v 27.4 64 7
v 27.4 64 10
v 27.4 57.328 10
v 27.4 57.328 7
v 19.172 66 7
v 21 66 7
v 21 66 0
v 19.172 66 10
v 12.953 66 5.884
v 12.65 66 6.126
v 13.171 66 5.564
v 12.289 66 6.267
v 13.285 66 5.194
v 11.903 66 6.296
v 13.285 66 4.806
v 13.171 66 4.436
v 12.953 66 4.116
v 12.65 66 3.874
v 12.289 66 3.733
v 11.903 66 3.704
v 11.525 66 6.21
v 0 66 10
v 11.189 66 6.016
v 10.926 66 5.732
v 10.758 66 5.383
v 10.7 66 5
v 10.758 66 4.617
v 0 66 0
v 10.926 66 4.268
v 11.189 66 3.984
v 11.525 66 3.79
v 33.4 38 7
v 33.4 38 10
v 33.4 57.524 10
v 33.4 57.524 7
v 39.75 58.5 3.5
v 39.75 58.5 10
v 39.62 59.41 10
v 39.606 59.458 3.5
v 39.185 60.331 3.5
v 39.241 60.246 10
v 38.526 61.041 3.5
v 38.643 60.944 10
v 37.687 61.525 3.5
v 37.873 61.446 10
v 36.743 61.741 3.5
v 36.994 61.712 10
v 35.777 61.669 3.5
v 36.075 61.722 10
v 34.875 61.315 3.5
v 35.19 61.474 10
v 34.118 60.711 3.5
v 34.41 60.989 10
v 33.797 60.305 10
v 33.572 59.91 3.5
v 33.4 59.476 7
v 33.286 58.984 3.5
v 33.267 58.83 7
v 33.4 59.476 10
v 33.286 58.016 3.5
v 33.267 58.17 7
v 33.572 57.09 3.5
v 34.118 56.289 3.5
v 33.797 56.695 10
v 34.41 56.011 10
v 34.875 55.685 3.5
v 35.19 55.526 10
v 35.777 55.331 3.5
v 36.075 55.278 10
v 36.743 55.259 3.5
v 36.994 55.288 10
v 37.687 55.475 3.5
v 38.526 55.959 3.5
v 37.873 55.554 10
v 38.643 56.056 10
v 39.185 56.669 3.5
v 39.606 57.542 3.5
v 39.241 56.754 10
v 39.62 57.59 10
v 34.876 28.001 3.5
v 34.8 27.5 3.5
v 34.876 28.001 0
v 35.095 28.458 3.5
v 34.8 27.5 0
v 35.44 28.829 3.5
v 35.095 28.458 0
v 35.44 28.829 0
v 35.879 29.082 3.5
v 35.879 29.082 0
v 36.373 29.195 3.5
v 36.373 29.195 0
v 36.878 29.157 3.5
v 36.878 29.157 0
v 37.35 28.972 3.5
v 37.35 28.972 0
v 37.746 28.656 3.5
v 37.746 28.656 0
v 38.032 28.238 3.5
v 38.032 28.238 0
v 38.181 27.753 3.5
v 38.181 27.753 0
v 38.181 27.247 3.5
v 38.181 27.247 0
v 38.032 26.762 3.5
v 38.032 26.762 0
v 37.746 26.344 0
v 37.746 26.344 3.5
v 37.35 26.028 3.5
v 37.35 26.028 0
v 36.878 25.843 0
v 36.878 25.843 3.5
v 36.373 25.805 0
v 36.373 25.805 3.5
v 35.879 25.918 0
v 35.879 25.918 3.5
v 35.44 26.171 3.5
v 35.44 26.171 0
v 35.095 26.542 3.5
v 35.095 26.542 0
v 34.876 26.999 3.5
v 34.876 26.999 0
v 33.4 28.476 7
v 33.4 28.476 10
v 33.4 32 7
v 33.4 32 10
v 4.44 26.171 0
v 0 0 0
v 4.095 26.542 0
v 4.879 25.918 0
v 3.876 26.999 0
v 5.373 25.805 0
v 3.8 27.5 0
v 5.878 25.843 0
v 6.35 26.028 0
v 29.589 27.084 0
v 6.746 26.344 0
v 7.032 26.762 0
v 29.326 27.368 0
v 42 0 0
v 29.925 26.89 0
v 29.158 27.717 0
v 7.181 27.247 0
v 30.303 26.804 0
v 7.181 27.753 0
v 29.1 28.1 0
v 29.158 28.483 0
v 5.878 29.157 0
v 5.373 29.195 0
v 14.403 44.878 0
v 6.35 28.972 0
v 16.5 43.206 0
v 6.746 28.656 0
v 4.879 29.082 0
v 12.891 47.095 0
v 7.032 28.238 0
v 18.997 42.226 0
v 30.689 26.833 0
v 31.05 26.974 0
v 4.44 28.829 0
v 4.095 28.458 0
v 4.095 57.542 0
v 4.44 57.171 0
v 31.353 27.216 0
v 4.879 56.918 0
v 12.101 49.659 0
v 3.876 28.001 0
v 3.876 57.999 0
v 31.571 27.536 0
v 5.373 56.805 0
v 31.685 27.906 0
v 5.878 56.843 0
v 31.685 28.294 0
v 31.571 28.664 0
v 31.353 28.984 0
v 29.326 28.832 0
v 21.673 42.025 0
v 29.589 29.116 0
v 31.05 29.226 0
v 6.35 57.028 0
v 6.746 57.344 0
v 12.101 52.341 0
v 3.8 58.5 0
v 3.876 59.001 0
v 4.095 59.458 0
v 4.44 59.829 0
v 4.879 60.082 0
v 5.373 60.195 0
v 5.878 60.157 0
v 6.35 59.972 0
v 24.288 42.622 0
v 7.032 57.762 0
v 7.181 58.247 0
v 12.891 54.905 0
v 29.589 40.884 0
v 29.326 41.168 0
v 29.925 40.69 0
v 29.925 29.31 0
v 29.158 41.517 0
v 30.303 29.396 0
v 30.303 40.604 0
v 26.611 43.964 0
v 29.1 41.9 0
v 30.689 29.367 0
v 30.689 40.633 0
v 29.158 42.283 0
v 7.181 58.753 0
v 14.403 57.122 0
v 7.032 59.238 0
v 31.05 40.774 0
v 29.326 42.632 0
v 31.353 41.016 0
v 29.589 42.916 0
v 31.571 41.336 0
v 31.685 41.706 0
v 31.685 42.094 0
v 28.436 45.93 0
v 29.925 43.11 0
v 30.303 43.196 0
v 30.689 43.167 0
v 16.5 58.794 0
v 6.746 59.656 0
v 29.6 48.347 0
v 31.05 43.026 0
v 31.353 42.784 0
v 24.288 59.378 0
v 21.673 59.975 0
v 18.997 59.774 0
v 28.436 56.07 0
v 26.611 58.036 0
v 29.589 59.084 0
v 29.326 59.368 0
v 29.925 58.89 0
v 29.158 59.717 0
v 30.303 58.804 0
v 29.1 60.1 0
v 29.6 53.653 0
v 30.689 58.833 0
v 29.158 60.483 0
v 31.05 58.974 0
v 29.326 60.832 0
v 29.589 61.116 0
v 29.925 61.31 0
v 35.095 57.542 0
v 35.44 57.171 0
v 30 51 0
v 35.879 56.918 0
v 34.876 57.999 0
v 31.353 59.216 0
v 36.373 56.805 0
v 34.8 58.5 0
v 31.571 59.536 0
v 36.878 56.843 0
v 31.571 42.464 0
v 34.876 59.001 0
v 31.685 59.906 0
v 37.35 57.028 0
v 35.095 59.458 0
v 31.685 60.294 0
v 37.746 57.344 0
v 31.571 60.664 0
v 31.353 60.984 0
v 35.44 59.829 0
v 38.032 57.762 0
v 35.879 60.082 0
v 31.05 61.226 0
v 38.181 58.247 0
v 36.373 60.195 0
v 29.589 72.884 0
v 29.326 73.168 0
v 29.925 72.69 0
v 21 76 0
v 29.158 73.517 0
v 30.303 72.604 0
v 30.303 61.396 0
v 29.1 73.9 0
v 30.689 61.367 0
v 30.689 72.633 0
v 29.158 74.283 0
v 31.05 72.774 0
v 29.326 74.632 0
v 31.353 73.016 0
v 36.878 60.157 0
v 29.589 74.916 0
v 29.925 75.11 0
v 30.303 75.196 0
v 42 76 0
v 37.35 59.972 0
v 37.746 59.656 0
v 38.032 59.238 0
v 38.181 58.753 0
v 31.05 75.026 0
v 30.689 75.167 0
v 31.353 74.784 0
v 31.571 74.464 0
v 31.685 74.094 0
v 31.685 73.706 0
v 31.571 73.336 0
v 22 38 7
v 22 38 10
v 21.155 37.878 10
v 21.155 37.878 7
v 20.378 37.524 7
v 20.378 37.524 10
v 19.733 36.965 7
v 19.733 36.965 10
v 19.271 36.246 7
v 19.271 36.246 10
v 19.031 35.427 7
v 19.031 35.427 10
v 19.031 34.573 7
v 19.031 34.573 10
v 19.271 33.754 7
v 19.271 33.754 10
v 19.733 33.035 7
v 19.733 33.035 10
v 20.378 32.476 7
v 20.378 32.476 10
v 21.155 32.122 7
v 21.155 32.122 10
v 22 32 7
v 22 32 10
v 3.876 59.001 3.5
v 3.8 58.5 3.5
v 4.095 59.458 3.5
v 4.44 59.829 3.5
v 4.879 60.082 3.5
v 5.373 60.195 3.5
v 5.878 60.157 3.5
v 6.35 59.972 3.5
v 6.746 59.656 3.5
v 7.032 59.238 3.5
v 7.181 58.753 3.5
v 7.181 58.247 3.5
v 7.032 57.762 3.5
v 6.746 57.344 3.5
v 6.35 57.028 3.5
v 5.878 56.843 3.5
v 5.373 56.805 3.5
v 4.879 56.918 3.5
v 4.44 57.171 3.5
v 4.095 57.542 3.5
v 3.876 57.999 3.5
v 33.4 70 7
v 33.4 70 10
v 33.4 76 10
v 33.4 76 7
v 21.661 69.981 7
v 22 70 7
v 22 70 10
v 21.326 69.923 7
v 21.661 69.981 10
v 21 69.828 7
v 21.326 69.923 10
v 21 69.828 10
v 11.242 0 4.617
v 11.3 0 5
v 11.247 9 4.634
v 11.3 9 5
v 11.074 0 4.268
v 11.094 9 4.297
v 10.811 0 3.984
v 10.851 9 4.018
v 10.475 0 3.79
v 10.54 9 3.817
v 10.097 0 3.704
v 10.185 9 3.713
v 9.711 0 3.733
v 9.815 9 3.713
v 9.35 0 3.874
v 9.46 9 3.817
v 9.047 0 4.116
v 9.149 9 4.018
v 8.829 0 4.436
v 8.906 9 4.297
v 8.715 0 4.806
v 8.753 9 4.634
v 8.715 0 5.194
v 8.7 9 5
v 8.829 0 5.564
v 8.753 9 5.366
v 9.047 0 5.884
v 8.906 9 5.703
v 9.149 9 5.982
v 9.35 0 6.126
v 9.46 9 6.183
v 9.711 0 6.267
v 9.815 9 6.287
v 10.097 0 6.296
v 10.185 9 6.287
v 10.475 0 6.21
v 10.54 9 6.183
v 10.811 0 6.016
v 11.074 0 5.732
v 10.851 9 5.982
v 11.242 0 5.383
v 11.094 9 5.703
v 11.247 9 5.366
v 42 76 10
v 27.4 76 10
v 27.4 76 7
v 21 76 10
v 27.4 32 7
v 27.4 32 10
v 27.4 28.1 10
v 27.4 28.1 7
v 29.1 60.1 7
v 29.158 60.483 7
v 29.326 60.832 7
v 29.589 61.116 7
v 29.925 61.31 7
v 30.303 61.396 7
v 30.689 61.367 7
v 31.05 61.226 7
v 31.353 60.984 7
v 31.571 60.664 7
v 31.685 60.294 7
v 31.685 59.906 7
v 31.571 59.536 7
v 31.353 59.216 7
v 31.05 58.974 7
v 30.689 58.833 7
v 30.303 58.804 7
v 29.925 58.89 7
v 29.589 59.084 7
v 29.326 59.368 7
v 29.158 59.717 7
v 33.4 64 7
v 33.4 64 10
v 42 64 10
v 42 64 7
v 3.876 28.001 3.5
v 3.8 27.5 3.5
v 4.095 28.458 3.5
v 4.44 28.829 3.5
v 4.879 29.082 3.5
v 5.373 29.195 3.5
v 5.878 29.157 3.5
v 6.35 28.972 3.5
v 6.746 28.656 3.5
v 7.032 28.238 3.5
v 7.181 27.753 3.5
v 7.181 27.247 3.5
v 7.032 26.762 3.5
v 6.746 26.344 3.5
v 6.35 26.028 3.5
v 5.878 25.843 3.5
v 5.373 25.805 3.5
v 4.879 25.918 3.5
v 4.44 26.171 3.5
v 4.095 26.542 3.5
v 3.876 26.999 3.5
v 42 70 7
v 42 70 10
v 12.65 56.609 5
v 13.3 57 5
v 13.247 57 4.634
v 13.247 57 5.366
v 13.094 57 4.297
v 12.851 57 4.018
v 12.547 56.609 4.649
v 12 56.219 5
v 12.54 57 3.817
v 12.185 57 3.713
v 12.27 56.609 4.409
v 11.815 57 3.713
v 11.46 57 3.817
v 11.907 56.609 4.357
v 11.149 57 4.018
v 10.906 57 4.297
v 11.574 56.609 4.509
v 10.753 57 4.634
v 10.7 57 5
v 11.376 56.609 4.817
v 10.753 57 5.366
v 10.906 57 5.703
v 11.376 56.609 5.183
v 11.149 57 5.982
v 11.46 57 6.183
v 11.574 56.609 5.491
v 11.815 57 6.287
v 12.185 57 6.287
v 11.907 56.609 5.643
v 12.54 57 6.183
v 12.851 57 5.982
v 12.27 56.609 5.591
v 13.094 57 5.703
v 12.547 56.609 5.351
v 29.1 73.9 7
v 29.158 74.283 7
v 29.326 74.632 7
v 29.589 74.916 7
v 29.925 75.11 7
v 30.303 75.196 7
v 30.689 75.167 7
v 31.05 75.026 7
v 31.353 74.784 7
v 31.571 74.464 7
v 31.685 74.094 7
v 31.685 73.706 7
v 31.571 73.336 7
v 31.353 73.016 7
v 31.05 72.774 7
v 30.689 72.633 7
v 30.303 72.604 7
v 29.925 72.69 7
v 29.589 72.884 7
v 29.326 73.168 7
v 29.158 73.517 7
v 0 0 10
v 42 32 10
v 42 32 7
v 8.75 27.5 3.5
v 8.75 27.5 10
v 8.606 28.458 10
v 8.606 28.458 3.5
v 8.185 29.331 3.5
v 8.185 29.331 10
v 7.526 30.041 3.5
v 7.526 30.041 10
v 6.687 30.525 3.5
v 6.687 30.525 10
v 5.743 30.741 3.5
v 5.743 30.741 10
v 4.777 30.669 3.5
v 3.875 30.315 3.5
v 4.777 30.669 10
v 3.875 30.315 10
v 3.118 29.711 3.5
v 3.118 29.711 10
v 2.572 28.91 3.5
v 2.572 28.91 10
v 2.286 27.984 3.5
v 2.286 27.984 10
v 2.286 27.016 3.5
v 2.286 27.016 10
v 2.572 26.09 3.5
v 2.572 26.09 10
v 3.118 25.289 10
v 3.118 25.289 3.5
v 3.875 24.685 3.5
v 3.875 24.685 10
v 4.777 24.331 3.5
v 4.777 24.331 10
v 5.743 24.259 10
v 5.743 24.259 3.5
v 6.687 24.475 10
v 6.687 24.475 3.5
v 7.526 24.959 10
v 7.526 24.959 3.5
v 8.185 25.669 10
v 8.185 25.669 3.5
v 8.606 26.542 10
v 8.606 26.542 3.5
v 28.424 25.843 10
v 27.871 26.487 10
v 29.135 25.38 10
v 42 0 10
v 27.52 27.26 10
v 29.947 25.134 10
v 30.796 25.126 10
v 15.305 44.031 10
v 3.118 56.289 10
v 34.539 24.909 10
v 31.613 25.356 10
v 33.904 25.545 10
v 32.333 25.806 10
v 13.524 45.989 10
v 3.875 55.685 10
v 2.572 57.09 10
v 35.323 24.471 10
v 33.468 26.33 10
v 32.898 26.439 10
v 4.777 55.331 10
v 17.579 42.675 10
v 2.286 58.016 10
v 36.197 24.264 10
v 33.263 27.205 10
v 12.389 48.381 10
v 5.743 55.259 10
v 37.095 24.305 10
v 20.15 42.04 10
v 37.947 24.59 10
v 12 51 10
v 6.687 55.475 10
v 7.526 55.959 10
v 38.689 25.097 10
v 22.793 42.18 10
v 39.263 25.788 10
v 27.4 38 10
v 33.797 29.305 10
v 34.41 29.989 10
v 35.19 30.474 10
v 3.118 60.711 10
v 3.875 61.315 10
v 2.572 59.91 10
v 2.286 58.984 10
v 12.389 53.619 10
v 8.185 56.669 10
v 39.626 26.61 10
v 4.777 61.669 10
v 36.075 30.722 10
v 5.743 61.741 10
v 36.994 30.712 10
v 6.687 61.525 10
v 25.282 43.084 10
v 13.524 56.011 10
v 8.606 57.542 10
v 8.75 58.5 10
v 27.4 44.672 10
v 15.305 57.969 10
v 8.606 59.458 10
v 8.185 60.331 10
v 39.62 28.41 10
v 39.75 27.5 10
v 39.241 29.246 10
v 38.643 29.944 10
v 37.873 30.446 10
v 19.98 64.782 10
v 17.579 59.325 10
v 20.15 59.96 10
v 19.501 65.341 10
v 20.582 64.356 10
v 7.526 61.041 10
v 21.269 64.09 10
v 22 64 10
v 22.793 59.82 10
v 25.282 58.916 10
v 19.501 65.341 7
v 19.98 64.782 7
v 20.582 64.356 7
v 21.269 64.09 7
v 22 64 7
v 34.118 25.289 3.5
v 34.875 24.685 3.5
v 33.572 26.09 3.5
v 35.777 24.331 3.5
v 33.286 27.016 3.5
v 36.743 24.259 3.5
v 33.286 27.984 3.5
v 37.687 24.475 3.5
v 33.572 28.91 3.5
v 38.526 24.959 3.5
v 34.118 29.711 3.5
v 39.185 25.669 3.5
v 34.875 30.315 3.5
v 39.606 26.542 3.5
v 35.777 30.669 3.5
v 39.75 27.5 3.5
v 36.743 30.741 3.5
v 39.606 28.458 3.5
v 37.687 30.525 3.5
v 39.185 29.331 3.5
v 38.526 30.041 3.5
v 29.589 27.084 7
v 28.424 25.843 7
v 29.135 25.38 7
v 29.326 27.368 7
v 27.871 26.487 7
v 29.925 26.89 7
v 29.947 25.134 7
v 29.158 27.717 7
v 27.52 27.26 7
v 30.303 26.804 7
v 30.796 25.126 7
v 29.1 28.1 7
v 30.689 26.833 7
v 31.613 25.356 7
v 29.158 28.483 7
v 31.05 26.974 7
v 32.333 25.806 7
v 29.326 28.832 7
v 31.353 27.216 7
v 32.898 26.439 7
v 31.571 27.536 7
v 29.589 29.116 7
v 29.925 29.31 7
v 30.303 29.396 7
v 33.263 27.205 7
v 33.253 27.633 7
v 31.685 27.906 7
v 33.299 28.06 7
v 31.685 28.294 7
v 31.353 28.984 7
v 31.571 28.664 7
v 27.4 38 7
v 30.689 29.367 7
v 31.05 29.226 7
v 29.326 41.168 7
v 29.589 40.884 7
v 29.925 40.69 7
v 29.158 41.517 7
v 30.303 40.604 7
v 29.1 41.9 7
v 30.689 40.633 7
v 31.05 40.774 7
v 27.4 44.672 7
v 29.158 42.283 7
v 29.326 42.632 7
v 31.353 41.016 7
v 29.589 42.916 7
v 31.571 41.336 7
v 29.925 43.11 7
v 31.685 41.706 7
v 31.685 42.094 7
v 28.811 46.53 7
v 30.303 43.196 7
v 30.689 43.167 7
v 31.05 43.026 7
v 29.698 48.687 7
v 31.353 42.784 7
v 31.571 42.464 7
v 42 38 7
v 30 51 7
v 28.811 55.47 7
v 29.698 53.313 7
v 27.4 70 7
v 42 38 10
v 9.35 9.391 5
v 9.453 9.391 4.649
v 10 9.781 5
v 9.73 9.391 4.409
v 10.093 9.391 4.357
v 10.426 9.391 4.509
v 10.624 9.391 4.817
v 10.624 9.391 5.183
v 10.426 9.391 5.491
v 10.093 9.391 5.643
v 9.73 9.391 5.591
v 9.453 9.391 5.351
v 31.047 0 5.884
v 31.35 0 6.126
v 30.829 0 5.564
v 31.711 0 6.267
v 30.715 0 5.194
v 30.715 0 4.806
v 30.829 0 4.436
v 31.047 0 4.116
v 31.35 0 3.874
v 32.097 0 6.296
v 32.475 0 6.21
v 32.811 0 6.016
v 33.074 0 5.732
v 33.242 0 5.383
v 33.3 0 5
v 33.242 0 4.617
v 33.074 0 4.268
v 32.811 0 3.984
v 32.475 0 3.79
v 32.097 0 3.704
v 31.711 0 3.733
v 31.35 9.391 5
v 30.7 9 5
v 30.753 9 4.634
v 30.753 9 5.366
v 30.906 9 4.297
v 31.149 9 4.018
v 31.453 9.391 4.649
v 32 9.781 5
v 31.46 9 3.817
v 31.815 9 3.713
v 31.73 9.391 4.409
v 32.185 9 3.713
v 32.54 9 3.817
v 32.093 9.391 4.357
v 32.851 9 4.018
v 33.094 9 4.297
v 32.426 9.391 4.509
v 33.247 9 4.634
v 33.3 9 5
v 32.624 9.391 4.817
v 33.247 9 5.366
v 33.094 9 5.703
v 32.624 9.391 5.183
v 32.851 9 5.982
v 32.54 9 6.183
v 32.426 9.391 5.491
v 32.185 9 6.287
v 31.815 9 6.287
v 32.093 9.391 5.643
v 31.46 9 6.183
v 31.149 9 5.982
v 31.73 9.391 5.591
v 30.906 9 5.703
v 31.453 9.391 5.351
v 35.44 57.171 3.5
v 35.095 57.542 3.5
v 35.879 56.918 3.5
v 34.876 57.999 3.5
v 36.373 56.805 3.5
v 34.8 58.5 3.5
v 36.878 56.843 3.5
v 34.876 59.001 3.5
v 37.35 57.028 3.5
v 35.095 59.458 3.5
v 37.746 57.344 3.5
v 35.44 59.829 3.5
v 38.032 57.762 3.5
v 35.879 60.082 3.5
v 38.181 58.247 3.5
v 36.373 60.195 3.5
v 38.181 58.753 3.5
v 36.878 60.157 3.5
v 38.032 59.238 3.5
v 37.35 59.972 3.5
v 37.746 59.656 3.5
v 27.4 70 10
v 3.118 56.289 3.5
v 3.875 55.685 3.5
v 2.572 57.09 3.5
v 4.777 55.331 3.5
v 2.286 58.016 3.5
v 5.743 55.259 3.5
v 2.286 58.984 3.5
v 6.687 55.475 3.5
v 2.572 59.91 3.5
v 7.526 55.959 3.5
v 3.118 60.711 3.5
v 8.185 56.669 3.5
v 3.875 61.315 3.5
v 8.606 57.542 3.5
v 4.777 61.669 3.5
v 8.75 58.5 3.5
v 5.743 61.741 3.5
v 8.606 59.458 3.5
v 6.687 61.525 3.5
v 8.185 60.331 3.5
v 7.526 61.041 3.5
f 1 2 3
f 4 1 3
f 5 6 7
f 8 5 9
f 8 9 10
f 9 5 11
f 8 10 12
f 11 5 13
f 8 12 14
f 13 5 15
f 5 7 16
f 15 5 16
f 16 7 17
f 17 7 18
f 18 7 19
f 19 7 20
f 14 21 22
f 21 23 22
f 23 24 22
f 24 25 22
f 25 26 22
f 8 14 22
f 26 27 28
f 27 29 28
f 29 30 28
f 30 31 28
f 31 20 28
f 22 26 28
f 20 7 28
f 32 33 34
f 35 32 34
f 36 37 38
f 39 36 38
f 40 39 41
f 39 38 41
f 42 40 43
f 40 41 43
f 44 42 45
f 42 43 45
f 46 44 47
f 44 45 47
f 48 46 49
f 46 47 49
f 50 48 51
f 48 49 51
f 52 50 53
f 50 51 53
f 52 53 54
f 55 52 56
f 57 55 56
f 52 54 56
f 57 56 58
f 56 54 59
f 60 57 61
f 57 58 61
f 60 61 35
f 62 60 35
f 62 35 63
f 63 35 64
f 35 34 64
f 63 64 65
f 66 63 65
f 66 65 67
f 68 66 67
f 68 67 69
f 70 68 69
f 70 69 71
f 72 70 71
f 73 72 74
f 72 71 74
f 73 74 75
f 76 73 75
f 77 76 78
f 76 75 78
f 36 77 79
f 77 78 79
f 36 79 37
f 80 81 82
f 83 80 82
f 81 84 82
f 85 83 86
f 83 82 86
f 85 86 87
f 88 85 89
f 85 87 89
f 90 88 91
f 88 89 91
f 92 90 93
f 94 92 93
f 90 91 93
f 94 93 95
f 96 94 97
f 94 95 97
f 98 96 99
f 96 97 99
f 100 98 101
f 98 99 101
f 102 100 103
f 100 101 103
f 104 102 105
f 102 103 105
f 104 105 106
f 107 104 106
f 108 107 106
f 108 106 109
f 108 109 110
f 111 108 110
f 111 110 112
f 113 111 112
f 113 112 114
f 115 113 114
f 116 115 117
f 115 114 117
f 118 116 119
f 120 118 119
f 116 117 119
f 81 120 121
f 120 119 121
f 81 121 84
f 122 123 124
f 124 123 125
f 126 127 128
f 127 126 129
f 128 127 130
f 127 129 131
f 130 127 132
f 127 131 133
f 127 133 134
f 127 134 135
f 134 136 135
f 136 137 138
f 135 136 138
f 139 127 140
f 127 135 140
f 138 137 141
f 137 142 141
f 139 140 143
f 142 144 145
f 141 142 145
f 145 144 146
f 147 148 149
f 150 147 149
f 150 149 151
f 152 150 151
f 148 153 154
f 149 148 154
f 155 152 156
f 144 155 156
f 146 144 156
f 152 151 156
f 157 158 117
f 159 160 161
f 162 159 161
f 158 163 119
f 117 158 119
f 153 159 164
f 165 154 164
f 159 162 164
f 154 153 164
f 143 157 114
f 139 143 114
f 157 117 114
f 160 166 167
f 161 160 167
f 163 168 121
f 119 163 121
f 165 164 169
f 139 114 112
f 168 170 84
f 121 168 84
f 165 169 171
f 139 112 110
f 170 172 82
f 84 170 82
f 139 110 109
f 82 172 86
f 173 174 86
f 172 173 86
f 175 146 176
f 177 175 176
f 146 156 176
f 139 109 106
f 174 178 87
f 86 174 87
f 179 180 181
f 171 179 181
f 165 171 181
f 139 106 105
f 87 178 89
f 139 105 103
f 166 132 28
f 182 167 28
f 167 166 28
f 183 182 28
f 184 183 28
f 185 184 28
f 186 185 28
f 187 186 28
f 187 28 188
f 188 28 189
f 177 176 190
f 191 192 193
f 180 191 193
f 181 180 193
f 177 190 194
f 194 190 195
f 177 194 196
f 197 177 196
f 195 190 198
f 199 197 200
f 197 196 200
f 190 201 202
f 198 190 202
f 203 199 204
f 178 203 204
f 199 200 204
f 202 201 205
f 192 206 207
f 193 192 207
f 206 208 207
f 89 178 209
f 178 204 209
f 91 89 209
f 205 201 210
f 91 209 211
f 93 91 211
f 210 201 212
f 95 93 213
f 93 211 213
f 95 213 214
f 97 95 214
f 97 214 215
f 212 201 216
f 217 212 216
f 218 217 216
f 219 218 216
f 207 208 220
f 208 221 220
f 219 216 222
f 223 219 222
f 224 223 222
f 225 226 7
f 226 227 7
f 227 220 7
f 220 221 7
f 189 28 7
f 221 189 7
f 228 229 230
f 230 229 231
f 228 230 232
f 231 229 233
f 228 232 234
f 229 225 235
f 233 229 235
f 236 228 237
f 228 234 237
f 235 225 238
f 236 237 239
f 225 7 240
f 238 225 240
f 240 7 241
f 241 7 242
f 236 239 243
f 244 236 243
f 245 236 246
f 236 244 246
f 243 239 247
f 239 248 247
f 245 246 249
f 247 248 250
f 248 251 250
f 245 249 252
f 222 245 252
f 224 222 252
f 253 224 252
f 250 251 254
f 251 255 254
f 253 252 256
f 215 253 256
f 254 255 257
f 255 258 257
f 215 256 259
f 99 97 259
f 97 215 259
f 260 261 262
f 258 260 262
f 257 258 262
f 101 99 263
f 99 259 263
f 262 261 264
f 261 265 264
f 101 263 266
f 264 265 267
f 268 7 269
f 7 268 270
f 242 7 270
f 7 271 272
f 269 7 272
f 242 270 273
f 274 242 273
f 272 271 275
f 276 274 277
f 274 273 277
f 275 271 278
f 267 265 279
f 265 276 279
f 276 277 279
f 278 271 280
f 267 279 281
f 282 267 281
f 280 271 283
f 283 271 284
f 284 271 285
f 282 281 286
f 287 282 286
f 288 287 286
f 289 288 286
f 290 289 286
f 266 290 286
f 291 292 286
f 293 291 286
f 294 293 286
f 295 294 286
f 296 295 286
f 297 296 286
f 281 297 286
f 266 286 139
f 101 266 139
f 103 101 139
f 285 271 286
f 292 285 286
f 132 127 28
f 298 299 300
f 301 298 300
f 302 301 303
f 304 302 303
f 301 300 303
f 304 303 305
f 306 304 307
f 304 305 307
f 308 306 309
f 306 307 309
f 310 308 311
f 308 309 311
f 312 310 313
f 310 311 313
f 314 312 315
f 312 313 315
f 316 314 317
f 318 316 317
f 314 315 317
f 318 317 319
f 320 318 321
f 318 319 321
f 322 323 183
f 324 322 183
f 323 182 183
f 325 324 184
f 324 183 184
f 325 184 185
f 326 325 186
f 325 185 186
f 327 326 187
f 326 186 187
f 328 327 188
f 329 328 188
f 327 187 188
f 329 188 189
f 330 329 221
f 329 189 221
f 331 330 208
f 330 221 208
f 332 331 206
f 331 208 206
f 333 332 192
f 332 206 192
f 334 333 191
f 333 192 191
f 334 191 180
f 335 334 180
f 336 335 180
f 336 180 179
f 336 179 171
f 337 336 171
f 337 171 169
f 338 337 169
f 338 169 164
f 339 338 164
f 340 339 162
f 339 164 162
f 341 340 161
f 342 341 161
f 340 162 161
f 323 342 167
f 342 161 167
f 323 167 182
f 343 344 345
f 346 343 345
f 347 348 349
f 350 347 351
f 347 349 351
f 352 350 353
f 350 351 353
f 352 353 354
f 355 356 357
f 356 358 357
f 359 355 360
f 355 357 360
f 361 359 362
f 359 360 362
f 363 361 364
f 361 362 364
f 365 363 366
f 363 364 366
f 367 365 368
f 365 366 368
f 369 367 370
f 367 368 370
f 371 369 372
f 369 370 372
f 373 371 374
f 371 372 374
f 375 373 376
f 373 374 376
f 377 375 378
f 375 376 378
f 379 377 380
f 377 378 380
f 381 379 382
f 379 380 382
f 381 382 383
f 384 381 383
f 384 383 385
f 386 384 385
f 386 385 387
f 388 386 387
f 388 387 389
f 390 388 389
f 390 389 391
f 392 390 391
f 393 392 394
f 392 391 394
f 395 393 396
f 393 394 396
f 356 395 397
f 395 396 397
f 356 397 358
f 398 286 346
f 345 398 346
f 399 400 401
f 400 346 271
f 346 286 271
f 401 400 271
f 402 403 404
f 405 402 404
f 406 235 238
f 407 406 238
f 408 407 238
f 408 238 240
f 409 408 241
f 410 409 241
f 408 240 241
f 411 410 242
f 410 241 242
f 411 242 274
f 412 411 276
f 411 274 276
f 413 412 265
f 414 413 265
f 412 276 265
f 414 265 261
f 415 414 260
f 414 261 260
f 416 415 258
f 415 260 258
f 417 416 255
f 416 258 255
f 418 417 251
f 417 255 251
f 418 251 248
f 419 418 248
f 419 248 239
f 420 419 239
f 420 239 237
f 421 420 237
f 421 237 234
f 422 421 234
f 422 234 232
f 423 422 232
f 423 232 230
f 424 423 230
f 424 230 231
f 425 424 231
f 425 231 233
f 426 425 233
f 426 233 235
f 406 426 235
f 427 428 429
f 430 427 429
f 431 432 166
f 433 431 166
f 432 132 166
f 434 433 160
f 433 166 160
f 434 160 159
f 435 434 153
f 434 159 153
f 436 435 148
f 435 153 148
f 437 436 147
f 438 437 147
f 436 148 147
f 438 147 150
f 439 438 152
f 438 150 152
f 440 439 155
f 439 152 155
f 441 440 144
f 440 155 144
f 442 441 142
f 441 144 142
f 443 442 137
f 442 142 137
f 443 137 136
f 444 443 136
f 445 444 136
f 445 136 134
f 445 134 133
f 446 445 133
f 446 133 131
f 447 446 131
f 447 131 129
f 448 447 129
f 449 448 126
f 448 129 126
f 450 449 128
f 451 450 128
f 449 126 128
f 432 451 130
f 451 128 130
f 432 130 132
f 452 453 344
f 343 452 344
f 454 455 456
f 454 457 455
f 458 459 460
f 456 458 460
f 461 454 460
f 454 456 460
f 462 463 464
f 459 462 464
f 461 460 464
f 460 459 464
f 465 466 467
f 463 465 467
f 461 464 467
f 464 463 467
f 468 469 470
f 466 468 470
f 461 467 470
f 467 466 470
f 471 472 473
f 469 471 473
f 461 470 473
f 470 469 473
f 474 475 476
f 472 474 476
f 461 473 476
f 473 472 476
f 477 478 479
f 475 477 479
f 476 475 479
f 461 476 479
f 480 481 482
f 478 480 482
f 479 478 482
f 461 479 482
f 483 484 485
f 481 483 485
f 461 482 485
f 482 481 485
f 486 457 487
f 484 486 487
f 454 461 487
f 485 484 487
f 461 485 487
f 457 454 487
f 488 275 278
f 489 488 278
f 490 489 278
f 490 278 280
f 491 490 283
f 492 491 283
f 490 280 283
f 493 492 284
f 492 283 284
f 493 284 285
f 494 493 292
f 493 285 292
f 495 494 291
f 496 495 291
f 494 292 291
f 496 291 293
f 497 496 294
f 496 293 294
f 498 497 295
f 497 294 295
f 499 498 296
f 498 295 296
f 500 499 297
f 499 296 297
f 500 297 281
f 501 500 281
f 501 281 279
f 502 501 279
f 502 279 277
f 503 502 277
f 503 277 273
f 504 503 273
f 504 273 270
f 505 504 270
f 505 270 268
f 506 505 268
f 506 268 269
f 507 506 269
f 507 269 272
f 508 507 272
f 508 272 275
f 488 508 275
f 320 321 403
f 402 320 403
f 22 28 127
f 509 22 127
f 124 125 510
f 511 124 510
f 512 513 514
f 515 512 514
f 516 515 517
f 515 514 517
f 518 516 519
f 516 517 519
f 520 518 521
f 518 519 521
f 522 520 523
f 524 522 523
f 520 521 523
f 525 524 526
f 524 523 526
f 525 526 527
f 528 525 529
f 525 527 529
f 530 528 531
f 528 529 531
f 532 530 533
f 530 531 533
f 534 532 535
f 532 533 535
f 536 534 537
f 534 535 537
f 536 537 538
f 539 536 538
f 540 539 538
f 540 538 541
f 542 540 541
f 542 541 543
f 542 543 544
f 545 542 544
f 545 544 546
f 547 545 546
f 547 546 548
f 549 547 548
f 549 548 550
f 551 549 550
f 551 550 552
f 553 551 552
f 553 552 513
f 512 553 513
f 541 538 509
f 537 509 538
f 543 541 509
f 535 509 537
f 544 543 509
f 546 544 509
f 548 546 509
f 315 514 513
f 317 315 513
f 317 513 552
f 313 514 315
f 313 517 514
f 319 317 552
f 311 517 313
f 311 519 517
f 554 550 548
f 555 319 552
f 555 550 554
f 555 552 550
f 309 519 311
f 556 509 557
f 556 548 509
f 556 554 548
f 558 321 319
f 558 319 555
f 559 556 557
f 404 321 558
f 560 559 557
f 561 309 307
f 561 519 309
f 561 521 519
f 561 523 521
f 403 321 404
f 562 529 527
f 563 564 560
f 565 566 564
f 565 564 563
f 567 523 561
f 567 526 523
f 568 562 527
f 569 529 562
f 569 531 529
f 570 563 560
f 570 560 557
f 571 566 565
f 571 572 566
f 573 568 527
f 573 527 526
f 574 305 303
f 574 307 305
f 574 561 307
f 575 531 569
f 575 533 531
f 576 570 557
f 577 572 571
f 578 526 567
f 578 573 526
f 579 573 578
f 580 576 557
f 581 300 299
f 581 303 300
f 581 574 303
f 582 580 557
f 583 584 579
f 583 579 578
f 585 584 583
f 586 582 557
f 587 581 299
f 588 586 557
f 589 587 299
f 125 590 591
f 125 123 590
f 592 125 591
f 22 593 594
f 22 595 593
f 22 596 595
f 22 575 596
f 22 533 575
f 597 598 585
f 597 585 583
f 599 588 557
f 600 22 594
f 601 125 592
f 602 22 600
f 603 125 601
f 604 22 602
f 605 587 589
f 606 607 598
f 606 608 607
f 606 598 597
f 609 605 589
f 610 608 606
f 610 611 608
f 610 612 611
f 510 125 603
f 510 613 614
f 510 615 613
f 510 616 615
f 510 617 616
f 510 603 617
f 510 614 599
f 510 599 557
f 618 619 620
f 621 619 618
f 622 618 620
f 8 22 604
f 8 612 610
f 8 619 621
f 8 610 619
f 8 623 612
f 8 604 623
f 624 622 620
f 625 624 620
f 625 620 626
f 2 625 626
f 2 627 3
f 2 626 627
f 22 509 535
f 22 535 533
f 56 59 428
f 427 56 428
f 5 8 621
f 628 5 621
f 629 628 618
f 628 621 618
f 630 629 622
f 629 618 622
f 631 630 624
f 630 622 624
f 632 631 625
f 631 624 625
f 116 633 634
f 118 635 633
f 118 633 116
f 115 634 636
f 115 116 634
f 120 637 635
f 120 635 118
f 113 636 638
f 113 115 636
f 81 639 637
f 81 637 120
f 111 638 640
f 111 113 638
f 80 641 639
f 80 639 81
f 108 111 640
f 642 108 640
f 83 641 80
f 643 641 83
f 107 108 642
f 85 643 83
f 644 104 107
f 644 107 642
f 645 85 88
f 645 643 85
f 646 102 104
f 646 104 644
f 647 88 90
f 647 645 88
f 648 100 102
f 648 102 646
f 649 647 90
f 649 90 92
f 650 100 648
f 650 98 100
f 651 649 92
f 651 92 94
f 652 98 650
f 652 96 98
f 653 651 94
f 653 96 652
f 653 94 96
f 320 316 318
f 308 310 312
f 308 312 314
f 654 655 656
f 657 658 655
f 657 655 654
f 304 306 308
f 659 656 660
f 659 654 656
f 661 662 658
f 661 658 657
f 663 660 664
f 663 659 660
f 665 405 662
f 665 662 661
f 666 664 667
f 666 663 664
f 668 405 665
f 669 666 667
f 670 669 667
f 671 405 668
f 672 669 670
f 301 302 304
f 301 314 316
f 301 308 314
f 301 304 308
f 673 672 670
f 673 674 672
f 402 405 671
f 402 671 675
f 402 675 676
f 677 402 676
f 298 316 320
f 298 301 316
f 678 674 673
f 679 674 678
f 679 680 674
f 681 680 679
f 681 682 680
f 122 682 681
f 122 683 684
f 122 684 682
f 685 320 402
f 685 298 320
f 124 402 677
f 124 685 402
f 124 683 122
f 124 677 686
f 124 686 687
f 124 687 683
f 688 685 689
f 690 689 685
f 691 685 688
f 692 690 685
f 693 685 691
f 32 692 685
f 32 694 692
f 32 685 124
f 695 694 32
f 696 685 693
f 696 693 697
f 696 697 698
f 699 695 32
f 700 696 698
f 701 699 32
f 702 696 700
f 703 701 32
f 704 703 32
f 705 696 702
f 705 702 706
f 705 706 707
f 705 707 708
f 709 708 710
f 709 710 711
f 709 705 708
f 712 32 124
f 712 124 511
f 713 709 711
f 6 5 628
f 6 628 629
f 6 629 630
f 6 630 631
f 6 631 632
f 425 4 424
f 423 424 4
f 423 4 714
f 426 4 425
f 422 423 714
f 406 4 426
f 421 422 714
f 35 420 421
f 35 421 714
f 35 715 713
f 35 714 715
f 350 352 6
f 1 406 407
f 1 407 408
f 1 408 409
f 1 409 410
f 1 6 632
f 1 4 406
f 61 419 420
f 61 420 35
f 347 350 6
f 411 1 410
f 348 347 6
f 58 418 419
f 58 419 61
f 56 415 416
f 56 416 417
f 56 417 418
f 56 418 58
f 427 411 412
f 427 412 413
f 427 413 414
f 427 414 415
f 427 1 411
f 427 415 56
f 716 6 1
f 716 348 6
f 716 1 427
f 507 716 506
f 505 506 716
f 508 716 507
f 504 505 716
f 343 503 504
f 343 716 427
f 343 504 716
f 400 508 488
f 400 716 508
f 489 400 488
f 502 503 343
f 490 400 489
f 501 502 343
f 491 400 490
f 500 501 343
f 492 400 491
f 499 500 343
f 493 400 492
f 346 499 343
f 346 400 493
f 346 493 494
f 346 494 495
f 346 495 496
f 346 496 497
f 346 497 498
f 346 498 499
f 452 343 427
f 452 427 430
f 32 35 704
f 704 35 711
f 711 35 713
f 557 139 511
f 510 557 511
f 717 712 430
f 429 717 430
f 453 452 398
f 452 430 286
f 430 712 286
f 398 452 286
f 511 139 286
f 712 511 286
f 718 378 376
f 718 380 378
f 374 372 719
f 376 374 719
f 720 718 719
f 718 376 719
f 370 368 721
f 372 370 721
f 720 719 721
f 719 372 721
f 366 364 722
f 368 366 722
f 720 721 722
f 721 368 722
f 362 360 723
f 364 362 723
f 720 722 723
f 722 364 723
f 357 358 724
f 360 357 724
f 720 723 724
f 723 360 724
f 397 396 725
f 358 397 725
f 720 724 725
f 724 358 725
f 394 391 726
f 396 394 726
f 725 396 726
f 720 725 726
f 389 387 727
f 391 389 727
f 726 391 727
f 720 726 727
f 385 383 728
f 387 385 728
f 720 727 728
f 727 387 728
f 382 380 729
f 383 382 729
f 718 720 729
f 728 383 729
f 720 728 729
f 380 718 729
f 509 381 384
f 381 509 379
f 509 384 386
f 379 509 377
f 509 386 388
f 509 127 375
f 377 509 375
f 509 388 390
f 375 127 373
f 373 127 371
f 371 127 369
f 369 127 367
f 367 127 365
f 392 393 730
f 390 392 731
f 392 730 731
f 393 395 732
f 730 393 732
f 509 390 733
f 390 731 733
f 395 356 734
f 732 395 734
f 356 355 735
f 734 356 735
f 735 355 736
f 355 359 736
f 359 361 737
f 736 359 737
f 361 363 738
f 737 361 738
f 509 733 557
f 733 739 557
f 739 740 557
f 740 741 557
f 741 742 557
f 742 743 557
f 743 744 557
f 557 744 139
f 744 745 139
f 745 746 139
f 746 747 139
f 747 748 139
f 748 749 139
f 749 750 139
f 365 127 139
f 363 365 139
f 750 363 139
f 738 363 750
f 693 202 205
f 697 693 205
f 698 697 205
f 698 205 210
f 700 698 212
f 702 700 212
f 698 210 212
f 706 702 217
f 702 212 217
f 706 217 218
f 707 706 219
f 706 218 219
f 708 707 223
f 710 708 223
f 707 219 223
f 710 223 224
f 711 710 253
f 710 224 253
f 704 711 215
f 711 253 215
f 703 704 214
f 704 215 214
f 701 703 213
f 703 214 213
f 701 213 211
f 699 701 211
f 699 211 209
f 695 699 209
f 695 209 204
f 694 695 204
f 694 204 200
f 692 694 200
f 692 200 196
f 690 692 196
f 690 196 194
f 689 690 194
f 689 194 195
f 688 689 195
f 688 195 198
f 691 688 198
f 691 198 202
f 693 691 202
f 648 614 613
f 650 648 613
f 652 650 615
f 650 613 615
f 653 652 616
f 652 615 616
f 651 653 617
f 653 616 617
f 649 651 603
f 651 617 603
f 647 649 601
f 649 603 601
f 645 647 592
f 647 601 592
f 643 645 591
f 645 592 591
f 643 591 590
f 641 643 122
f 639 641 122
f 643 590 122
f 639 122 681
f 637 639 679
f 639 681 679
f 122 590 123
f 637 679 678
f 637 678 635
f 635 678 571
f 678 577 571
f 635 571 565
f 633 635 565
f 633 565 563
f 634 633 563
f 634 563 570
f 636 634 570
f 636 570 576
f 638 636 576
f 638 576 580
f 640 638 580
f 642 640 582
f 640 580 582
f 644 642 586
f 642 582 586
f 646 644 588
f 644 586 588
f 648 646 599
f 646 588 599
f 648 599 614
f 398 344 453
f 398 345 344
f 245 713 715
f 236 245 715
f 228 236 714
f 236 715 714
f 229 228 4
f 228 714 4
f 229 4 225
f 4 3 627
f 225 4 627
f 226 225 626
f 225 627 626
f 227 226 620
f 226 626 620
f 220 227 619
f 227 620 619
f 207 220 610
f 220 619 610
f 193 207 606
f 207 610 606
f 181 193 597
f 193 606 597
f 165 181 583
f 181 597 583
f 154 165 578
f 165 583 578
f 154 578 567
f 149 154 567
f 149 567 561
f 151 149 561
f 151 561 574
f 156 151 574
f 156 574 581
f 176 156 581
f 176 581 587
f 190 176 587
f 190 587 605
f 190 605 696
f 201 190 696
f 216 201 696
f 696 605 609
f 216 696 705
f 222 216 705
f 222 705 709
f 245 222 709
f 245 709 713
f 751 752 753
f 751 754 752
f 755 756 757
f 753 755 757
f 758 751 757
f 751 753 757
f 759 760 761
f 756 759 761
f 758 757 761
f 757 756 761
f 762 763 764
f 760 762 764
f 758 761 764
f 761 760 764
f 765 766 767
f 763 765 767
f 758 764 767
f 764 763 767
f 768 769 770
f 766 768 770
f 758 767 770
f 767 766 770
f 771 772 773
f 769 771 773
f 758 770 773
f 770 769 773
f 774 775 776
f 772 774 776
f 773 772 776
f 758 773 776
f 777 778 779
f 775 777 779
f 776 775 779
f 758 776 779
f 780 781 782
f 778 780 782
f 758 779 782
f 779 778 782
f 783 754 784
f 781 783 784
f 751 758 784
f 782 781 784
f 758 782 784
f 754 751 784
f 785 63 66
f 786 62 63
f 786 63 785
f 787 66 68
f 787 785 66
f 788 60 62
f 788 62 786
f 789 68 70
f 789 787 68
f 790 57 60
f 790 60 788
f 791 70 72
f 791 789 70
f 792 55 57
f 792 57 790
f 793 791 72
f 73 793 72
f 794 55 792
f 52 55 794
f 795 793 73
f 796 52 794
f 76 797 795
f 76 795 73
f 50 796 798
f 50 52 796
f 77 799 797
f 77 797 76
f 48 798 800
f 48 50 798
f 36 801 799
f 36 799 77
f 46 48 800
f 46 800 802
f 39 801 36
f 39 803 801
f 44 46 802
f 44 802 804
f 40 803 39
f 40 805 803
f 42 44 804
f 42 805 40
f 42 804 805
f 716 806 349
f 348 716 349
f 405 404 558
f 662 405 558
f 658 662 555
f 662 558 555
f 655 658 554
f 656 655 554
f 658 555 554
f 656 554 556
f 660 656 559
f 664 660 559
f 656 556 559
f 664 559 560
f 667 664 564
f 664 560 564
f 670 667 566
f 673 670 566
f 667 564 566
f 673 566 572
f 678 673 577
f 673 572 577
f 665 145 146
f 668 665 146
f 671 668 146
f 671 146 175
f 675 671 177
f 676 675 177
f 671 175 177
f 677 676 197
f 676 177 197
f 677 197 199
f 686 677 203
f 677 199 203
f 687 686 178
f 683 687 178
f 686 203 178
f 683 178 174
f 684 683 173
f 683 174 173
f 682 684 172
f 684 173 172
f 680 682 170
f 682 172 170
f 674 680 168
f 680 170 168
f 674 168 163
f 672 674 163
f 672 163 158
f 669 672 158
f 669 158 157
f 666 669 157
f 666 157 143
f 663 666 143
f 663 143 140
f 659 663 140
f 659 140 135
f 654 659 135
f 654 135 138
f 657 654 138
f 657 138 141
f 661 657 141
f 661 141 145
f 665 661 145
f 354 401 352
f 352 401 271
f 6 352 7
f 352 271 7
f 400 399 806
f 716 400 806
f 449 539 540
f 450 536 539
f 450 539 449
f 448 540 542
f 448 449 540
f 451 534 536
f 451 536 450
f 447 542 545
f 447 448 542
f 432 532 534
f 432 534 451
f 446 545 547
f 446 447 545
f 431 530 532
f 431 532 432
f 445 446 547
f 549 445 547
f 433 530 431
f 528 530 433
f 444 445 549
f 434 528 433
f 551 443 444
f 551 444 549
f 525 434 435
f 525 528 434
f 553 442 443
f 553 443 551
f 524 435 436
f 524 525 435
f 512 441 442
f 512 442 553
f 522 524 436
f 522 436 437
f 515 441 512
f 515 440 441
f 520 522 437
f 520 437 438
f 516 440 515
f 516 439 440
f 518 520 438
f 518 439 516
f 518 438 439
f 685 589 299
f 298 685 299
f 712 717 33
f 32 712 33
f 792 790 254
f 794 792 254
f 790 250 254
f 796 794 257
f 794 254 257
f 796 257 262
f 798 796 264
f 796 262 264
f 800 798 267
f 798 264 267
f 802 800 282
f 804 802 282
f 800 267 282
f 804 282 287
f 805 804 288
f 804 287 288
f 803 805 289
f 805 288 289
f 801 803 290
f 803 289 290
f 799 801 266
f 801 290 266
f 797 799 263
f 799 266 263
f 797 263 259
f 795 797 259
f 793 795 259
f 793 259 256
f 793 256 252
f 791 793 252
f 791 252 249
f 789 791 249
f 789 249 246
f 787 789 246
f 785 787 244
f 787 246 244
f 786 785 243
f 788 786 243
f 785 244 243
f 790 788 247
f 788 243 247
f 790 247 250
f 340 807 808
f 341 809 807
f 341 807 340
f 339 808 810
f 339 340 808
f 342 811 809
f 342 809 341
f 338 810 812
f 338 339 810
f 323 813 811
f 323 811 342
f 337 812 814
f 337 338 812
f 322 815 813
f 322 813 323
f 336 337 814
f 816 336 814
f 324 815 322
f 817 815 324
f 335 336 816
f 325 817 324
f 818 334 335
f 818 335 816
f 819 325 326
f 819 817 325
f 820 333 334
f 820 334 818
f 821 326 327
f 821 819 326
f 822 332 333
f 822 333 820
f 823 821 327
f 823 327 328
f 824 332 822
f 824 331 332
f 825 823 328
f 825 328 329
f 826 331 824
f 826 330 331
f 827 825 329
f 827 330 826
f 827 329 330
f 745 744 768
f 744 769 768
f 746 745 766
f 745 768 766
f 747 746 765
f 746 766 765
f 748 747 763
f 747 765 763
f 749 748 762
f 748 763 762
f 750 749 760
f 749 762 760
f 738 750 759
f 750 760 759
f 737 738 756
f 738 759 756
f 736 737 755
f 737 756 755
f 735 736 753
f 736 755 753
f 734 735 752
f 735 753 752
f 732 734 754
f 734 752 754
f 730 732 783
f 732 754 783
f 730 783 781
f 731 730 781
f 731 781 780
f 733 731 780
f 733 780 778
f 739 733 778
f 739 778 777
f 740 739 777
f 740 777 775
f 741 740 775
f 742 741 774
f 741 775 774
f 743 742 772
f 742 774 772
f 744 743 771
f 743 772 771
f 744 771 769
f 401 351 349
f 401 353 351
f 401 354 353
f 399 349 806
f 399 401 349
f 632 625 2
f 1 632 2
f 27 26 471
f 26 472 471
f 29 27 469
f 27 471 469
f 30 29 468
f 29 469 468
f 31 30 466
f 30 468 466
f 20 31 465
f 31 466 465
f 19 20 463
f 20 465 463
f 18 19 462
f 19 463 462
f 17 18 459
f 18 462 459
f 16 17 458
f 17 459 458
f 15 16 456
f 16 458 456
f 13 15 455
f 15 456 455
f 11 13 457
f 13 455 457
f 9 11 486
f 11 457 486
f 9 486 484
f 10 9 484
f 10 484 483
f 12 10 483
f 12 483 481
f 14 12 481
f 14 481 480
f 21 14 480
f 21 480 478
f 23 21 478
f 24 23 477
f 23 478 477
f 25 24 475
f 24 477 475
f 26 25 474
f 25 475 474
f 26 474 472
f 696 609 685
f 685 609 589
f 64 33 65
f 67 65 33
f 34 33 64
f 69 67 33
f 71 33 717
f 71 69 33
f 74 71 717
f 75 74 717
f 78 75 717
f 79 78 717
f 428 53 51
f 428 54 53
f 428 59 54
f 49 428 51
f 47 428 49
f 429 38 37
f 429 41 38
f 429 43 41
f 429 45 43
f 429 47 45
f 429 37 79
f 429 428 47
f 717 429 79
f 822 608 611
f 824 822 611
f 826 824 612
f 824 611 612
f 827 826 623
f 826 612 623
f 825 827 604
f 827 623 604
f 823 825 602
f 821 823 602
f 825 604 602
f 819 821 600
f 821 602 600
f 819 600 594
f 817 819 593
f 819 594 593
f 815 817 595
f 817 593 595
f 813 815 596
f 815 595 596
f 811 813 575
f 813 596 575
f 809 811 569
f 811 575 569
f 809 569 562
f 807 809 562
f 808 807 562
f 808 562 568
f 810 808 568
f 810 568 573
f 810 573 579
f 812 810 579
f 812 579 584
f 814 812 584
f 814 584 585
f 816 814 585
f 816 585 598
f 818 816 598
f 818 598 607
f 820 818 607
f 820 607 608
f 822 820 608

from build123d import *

# Parameters (mm, degrees)
BOSS_EXTRUDE1_DEPTH                      = 10
CUT_EXTRUDE1_REACH                       = 89.407
SKETCH2_R                                = 9
CUT_EXTRUDE2_DEPTH                       = 3
CBORE_FOR_M3_PAN_HEAD_SCREW1_D           = 3.4
CBORE_FOR_M3_PAN_HEAD_SCREW1_CBORE_D     = 6.5
CBORE_FOR_M3_PAN_HEAD_SCREW1_CBORE_DEPTH = 6.5
M3X0_5_TAPPED_HOLE1_D                    = 2.6
M3X0_5_TAPPED_HOLE2_D                    = 2.6
M3X0_5_TAPPED_HOLE2_DEPTH                = 9
M3X0_5_TAPPED_HOLE2_TIP                  = 0.781118805
M3X0_5_TAPPED_HOLE3_D                    = 2.6
M3X0_5_TAPPED_HOLE3_DEPTH                = 9
M3X0_5_TAPPED_HOLE3_TIP                  = 0.781118805


with BuildPart() as part:
    # Sketch1 → Boss-Extrude1 (new body)
    with BuildSketch(Plane.XY):
        Polygon((0, 0), (42, 0), (42, 66), (42, 76), (21, 76), (21, 66), (0, 66), align=None)
    extrude(amount=BOSS_EXTRUDE1_DEPTH)

    # Sketch2 → Cut-Extrude1 (cut, up to next)
    with BuildSketch(Plane.XY.offset(10), mode=Mode.PRIVATE) as cut_extrude1_sk1:
        with Locations((21, 51)):
            Circle(SKETCH2_R)
    cut_extrude1_tool1 = extrude(cut_extrude1_sk1.sketch, amount=-CUT_EXTRUDE1_REACH, mode=Mode.PRIVATE) & part.part
    add(cut_extrude1_tool1.solids().sort_by_distance((21, 51, 10))[0], mode=Mode.SUBTRACT)

    # Sketch3 → Cut-Extrude2 (cut)
    with BuildSketch(Plane.XY.offset(10)):
        with BuildLine():
            Line((27.4, 32), (27.4, 28.1))
            ThreePointArc((27.4, 28.1), (30.4, 25.1), (33.4, 28.1))
            Line((33.4, 28.1), (33.4, 32))
            Line((33.4, 32), (42, 32))
            Line((42, 32), (42, 38))
            Line((42, 38), (33.4, 38))
            Line((33.4, 38), (33.4, 64))
            Line((33.4, 64), (42, 64))
            Line((42, 64), (42, 70))
            Line((42, 70), (33.4, 70))
            Line((33.4, 70), (33.4, 76))
            Line((33.4, 76), (27.4, 76))
            Line((27.4, 76), (27.4, 70))
            Line((27.4, 70), (22, 70))
            ThreePointArc((22, 70), (19, 67), (22, 64))
            Line((22, 64), (27.4, 64))
            Line((27.4, 64), (27.4, 38))
            Line((27.4, 38), (22, 38))
            ThreePointArc((22, 38), (19, 35), (22, 32))
            Line((22, 32), (27.4, 32))
        make_face()
    extrude(amount=-CUT_EXTRUDE2_DEPTH, mode=Mode.SUBTRACT)

    # CBORE for M3 Pan Head Screw1 (through all)
    with Locations(Plane.XY.offset(10)):
        with Locations((5.5, 58.5), (36.5, 58.5), (5.5, 27.5), (36.5, 27.5)):
            CounterBoreHole(CBORE_FOR_M3_PAN_HEAD_SCREW1_D / 2, CBORE_FOR_M3_PAN_HEAD_SCREW1_CBORE_D / 2, CBORE_FOR_M3_PAN_HEAD_SCREW1_CBORE_DEPTH)

    # M3x0.5 Tapped Hole1 (through all)
    with Locations(Plane.XY.offset(7)):
        with Locations((30.4, 73.9), (30.4, 60.1), (30.4, 41.9), (30.4, 28.1)):
            Hole(M3X0_5_TAPPED_HOLE1_D / 2)

    # M3x0.5 Tapped Hole2
    with Locations(Plane(origin=(0, 0, 0), x_dir=(-1, 0, 0), z_dir=(0, -1, 0))):
        with Locations((-10, -5), (-32, -5)):
            Hole(M3X0_5_TAPPED_HOLE2_D / 2, depth=M3X0_5_TAPPED_HOLE2_DEPTH)
            with Locations((0, 0, -(M3X0_5_TAPPED_HOLE2_DEPTH + M3X0_5_TAPPED_HOLE2_TIP / 2))):  # 118° drill point
                Cone(0, M3X0_5_TAPPED_HOLE2_D / 2, M3X0_5_TAPPED_HOLE2_TIP, mode=Mode.SUBTRACT)

    # M3x0.5 Tapped Hole3
    with Locations(Plane(origin=(0, 66, 0), x_dir=(1, 0, 0), z_dir=(0, 1, 0))):
        with Locations((12, -5)):
            Hole(M3X0_5_TAPPED_HOLE3_D / 2, depth=M3X0_5_TAPPED_HOLE3_DEPTH)
            with Locations((0, 0, -(M3X0_5_TAPPED_HOLE3_DEPTH + M3X0_5_TAPPED_HOLE3_TIP / 2))):  # 118° drill point
                Cone(0, M3X0_5_TAPPED_HOLE3_D / 2, M3X0_5_TAPPED_HOLE3_TIP, mode=Mode.SUBTRACT)


solid = part.part
